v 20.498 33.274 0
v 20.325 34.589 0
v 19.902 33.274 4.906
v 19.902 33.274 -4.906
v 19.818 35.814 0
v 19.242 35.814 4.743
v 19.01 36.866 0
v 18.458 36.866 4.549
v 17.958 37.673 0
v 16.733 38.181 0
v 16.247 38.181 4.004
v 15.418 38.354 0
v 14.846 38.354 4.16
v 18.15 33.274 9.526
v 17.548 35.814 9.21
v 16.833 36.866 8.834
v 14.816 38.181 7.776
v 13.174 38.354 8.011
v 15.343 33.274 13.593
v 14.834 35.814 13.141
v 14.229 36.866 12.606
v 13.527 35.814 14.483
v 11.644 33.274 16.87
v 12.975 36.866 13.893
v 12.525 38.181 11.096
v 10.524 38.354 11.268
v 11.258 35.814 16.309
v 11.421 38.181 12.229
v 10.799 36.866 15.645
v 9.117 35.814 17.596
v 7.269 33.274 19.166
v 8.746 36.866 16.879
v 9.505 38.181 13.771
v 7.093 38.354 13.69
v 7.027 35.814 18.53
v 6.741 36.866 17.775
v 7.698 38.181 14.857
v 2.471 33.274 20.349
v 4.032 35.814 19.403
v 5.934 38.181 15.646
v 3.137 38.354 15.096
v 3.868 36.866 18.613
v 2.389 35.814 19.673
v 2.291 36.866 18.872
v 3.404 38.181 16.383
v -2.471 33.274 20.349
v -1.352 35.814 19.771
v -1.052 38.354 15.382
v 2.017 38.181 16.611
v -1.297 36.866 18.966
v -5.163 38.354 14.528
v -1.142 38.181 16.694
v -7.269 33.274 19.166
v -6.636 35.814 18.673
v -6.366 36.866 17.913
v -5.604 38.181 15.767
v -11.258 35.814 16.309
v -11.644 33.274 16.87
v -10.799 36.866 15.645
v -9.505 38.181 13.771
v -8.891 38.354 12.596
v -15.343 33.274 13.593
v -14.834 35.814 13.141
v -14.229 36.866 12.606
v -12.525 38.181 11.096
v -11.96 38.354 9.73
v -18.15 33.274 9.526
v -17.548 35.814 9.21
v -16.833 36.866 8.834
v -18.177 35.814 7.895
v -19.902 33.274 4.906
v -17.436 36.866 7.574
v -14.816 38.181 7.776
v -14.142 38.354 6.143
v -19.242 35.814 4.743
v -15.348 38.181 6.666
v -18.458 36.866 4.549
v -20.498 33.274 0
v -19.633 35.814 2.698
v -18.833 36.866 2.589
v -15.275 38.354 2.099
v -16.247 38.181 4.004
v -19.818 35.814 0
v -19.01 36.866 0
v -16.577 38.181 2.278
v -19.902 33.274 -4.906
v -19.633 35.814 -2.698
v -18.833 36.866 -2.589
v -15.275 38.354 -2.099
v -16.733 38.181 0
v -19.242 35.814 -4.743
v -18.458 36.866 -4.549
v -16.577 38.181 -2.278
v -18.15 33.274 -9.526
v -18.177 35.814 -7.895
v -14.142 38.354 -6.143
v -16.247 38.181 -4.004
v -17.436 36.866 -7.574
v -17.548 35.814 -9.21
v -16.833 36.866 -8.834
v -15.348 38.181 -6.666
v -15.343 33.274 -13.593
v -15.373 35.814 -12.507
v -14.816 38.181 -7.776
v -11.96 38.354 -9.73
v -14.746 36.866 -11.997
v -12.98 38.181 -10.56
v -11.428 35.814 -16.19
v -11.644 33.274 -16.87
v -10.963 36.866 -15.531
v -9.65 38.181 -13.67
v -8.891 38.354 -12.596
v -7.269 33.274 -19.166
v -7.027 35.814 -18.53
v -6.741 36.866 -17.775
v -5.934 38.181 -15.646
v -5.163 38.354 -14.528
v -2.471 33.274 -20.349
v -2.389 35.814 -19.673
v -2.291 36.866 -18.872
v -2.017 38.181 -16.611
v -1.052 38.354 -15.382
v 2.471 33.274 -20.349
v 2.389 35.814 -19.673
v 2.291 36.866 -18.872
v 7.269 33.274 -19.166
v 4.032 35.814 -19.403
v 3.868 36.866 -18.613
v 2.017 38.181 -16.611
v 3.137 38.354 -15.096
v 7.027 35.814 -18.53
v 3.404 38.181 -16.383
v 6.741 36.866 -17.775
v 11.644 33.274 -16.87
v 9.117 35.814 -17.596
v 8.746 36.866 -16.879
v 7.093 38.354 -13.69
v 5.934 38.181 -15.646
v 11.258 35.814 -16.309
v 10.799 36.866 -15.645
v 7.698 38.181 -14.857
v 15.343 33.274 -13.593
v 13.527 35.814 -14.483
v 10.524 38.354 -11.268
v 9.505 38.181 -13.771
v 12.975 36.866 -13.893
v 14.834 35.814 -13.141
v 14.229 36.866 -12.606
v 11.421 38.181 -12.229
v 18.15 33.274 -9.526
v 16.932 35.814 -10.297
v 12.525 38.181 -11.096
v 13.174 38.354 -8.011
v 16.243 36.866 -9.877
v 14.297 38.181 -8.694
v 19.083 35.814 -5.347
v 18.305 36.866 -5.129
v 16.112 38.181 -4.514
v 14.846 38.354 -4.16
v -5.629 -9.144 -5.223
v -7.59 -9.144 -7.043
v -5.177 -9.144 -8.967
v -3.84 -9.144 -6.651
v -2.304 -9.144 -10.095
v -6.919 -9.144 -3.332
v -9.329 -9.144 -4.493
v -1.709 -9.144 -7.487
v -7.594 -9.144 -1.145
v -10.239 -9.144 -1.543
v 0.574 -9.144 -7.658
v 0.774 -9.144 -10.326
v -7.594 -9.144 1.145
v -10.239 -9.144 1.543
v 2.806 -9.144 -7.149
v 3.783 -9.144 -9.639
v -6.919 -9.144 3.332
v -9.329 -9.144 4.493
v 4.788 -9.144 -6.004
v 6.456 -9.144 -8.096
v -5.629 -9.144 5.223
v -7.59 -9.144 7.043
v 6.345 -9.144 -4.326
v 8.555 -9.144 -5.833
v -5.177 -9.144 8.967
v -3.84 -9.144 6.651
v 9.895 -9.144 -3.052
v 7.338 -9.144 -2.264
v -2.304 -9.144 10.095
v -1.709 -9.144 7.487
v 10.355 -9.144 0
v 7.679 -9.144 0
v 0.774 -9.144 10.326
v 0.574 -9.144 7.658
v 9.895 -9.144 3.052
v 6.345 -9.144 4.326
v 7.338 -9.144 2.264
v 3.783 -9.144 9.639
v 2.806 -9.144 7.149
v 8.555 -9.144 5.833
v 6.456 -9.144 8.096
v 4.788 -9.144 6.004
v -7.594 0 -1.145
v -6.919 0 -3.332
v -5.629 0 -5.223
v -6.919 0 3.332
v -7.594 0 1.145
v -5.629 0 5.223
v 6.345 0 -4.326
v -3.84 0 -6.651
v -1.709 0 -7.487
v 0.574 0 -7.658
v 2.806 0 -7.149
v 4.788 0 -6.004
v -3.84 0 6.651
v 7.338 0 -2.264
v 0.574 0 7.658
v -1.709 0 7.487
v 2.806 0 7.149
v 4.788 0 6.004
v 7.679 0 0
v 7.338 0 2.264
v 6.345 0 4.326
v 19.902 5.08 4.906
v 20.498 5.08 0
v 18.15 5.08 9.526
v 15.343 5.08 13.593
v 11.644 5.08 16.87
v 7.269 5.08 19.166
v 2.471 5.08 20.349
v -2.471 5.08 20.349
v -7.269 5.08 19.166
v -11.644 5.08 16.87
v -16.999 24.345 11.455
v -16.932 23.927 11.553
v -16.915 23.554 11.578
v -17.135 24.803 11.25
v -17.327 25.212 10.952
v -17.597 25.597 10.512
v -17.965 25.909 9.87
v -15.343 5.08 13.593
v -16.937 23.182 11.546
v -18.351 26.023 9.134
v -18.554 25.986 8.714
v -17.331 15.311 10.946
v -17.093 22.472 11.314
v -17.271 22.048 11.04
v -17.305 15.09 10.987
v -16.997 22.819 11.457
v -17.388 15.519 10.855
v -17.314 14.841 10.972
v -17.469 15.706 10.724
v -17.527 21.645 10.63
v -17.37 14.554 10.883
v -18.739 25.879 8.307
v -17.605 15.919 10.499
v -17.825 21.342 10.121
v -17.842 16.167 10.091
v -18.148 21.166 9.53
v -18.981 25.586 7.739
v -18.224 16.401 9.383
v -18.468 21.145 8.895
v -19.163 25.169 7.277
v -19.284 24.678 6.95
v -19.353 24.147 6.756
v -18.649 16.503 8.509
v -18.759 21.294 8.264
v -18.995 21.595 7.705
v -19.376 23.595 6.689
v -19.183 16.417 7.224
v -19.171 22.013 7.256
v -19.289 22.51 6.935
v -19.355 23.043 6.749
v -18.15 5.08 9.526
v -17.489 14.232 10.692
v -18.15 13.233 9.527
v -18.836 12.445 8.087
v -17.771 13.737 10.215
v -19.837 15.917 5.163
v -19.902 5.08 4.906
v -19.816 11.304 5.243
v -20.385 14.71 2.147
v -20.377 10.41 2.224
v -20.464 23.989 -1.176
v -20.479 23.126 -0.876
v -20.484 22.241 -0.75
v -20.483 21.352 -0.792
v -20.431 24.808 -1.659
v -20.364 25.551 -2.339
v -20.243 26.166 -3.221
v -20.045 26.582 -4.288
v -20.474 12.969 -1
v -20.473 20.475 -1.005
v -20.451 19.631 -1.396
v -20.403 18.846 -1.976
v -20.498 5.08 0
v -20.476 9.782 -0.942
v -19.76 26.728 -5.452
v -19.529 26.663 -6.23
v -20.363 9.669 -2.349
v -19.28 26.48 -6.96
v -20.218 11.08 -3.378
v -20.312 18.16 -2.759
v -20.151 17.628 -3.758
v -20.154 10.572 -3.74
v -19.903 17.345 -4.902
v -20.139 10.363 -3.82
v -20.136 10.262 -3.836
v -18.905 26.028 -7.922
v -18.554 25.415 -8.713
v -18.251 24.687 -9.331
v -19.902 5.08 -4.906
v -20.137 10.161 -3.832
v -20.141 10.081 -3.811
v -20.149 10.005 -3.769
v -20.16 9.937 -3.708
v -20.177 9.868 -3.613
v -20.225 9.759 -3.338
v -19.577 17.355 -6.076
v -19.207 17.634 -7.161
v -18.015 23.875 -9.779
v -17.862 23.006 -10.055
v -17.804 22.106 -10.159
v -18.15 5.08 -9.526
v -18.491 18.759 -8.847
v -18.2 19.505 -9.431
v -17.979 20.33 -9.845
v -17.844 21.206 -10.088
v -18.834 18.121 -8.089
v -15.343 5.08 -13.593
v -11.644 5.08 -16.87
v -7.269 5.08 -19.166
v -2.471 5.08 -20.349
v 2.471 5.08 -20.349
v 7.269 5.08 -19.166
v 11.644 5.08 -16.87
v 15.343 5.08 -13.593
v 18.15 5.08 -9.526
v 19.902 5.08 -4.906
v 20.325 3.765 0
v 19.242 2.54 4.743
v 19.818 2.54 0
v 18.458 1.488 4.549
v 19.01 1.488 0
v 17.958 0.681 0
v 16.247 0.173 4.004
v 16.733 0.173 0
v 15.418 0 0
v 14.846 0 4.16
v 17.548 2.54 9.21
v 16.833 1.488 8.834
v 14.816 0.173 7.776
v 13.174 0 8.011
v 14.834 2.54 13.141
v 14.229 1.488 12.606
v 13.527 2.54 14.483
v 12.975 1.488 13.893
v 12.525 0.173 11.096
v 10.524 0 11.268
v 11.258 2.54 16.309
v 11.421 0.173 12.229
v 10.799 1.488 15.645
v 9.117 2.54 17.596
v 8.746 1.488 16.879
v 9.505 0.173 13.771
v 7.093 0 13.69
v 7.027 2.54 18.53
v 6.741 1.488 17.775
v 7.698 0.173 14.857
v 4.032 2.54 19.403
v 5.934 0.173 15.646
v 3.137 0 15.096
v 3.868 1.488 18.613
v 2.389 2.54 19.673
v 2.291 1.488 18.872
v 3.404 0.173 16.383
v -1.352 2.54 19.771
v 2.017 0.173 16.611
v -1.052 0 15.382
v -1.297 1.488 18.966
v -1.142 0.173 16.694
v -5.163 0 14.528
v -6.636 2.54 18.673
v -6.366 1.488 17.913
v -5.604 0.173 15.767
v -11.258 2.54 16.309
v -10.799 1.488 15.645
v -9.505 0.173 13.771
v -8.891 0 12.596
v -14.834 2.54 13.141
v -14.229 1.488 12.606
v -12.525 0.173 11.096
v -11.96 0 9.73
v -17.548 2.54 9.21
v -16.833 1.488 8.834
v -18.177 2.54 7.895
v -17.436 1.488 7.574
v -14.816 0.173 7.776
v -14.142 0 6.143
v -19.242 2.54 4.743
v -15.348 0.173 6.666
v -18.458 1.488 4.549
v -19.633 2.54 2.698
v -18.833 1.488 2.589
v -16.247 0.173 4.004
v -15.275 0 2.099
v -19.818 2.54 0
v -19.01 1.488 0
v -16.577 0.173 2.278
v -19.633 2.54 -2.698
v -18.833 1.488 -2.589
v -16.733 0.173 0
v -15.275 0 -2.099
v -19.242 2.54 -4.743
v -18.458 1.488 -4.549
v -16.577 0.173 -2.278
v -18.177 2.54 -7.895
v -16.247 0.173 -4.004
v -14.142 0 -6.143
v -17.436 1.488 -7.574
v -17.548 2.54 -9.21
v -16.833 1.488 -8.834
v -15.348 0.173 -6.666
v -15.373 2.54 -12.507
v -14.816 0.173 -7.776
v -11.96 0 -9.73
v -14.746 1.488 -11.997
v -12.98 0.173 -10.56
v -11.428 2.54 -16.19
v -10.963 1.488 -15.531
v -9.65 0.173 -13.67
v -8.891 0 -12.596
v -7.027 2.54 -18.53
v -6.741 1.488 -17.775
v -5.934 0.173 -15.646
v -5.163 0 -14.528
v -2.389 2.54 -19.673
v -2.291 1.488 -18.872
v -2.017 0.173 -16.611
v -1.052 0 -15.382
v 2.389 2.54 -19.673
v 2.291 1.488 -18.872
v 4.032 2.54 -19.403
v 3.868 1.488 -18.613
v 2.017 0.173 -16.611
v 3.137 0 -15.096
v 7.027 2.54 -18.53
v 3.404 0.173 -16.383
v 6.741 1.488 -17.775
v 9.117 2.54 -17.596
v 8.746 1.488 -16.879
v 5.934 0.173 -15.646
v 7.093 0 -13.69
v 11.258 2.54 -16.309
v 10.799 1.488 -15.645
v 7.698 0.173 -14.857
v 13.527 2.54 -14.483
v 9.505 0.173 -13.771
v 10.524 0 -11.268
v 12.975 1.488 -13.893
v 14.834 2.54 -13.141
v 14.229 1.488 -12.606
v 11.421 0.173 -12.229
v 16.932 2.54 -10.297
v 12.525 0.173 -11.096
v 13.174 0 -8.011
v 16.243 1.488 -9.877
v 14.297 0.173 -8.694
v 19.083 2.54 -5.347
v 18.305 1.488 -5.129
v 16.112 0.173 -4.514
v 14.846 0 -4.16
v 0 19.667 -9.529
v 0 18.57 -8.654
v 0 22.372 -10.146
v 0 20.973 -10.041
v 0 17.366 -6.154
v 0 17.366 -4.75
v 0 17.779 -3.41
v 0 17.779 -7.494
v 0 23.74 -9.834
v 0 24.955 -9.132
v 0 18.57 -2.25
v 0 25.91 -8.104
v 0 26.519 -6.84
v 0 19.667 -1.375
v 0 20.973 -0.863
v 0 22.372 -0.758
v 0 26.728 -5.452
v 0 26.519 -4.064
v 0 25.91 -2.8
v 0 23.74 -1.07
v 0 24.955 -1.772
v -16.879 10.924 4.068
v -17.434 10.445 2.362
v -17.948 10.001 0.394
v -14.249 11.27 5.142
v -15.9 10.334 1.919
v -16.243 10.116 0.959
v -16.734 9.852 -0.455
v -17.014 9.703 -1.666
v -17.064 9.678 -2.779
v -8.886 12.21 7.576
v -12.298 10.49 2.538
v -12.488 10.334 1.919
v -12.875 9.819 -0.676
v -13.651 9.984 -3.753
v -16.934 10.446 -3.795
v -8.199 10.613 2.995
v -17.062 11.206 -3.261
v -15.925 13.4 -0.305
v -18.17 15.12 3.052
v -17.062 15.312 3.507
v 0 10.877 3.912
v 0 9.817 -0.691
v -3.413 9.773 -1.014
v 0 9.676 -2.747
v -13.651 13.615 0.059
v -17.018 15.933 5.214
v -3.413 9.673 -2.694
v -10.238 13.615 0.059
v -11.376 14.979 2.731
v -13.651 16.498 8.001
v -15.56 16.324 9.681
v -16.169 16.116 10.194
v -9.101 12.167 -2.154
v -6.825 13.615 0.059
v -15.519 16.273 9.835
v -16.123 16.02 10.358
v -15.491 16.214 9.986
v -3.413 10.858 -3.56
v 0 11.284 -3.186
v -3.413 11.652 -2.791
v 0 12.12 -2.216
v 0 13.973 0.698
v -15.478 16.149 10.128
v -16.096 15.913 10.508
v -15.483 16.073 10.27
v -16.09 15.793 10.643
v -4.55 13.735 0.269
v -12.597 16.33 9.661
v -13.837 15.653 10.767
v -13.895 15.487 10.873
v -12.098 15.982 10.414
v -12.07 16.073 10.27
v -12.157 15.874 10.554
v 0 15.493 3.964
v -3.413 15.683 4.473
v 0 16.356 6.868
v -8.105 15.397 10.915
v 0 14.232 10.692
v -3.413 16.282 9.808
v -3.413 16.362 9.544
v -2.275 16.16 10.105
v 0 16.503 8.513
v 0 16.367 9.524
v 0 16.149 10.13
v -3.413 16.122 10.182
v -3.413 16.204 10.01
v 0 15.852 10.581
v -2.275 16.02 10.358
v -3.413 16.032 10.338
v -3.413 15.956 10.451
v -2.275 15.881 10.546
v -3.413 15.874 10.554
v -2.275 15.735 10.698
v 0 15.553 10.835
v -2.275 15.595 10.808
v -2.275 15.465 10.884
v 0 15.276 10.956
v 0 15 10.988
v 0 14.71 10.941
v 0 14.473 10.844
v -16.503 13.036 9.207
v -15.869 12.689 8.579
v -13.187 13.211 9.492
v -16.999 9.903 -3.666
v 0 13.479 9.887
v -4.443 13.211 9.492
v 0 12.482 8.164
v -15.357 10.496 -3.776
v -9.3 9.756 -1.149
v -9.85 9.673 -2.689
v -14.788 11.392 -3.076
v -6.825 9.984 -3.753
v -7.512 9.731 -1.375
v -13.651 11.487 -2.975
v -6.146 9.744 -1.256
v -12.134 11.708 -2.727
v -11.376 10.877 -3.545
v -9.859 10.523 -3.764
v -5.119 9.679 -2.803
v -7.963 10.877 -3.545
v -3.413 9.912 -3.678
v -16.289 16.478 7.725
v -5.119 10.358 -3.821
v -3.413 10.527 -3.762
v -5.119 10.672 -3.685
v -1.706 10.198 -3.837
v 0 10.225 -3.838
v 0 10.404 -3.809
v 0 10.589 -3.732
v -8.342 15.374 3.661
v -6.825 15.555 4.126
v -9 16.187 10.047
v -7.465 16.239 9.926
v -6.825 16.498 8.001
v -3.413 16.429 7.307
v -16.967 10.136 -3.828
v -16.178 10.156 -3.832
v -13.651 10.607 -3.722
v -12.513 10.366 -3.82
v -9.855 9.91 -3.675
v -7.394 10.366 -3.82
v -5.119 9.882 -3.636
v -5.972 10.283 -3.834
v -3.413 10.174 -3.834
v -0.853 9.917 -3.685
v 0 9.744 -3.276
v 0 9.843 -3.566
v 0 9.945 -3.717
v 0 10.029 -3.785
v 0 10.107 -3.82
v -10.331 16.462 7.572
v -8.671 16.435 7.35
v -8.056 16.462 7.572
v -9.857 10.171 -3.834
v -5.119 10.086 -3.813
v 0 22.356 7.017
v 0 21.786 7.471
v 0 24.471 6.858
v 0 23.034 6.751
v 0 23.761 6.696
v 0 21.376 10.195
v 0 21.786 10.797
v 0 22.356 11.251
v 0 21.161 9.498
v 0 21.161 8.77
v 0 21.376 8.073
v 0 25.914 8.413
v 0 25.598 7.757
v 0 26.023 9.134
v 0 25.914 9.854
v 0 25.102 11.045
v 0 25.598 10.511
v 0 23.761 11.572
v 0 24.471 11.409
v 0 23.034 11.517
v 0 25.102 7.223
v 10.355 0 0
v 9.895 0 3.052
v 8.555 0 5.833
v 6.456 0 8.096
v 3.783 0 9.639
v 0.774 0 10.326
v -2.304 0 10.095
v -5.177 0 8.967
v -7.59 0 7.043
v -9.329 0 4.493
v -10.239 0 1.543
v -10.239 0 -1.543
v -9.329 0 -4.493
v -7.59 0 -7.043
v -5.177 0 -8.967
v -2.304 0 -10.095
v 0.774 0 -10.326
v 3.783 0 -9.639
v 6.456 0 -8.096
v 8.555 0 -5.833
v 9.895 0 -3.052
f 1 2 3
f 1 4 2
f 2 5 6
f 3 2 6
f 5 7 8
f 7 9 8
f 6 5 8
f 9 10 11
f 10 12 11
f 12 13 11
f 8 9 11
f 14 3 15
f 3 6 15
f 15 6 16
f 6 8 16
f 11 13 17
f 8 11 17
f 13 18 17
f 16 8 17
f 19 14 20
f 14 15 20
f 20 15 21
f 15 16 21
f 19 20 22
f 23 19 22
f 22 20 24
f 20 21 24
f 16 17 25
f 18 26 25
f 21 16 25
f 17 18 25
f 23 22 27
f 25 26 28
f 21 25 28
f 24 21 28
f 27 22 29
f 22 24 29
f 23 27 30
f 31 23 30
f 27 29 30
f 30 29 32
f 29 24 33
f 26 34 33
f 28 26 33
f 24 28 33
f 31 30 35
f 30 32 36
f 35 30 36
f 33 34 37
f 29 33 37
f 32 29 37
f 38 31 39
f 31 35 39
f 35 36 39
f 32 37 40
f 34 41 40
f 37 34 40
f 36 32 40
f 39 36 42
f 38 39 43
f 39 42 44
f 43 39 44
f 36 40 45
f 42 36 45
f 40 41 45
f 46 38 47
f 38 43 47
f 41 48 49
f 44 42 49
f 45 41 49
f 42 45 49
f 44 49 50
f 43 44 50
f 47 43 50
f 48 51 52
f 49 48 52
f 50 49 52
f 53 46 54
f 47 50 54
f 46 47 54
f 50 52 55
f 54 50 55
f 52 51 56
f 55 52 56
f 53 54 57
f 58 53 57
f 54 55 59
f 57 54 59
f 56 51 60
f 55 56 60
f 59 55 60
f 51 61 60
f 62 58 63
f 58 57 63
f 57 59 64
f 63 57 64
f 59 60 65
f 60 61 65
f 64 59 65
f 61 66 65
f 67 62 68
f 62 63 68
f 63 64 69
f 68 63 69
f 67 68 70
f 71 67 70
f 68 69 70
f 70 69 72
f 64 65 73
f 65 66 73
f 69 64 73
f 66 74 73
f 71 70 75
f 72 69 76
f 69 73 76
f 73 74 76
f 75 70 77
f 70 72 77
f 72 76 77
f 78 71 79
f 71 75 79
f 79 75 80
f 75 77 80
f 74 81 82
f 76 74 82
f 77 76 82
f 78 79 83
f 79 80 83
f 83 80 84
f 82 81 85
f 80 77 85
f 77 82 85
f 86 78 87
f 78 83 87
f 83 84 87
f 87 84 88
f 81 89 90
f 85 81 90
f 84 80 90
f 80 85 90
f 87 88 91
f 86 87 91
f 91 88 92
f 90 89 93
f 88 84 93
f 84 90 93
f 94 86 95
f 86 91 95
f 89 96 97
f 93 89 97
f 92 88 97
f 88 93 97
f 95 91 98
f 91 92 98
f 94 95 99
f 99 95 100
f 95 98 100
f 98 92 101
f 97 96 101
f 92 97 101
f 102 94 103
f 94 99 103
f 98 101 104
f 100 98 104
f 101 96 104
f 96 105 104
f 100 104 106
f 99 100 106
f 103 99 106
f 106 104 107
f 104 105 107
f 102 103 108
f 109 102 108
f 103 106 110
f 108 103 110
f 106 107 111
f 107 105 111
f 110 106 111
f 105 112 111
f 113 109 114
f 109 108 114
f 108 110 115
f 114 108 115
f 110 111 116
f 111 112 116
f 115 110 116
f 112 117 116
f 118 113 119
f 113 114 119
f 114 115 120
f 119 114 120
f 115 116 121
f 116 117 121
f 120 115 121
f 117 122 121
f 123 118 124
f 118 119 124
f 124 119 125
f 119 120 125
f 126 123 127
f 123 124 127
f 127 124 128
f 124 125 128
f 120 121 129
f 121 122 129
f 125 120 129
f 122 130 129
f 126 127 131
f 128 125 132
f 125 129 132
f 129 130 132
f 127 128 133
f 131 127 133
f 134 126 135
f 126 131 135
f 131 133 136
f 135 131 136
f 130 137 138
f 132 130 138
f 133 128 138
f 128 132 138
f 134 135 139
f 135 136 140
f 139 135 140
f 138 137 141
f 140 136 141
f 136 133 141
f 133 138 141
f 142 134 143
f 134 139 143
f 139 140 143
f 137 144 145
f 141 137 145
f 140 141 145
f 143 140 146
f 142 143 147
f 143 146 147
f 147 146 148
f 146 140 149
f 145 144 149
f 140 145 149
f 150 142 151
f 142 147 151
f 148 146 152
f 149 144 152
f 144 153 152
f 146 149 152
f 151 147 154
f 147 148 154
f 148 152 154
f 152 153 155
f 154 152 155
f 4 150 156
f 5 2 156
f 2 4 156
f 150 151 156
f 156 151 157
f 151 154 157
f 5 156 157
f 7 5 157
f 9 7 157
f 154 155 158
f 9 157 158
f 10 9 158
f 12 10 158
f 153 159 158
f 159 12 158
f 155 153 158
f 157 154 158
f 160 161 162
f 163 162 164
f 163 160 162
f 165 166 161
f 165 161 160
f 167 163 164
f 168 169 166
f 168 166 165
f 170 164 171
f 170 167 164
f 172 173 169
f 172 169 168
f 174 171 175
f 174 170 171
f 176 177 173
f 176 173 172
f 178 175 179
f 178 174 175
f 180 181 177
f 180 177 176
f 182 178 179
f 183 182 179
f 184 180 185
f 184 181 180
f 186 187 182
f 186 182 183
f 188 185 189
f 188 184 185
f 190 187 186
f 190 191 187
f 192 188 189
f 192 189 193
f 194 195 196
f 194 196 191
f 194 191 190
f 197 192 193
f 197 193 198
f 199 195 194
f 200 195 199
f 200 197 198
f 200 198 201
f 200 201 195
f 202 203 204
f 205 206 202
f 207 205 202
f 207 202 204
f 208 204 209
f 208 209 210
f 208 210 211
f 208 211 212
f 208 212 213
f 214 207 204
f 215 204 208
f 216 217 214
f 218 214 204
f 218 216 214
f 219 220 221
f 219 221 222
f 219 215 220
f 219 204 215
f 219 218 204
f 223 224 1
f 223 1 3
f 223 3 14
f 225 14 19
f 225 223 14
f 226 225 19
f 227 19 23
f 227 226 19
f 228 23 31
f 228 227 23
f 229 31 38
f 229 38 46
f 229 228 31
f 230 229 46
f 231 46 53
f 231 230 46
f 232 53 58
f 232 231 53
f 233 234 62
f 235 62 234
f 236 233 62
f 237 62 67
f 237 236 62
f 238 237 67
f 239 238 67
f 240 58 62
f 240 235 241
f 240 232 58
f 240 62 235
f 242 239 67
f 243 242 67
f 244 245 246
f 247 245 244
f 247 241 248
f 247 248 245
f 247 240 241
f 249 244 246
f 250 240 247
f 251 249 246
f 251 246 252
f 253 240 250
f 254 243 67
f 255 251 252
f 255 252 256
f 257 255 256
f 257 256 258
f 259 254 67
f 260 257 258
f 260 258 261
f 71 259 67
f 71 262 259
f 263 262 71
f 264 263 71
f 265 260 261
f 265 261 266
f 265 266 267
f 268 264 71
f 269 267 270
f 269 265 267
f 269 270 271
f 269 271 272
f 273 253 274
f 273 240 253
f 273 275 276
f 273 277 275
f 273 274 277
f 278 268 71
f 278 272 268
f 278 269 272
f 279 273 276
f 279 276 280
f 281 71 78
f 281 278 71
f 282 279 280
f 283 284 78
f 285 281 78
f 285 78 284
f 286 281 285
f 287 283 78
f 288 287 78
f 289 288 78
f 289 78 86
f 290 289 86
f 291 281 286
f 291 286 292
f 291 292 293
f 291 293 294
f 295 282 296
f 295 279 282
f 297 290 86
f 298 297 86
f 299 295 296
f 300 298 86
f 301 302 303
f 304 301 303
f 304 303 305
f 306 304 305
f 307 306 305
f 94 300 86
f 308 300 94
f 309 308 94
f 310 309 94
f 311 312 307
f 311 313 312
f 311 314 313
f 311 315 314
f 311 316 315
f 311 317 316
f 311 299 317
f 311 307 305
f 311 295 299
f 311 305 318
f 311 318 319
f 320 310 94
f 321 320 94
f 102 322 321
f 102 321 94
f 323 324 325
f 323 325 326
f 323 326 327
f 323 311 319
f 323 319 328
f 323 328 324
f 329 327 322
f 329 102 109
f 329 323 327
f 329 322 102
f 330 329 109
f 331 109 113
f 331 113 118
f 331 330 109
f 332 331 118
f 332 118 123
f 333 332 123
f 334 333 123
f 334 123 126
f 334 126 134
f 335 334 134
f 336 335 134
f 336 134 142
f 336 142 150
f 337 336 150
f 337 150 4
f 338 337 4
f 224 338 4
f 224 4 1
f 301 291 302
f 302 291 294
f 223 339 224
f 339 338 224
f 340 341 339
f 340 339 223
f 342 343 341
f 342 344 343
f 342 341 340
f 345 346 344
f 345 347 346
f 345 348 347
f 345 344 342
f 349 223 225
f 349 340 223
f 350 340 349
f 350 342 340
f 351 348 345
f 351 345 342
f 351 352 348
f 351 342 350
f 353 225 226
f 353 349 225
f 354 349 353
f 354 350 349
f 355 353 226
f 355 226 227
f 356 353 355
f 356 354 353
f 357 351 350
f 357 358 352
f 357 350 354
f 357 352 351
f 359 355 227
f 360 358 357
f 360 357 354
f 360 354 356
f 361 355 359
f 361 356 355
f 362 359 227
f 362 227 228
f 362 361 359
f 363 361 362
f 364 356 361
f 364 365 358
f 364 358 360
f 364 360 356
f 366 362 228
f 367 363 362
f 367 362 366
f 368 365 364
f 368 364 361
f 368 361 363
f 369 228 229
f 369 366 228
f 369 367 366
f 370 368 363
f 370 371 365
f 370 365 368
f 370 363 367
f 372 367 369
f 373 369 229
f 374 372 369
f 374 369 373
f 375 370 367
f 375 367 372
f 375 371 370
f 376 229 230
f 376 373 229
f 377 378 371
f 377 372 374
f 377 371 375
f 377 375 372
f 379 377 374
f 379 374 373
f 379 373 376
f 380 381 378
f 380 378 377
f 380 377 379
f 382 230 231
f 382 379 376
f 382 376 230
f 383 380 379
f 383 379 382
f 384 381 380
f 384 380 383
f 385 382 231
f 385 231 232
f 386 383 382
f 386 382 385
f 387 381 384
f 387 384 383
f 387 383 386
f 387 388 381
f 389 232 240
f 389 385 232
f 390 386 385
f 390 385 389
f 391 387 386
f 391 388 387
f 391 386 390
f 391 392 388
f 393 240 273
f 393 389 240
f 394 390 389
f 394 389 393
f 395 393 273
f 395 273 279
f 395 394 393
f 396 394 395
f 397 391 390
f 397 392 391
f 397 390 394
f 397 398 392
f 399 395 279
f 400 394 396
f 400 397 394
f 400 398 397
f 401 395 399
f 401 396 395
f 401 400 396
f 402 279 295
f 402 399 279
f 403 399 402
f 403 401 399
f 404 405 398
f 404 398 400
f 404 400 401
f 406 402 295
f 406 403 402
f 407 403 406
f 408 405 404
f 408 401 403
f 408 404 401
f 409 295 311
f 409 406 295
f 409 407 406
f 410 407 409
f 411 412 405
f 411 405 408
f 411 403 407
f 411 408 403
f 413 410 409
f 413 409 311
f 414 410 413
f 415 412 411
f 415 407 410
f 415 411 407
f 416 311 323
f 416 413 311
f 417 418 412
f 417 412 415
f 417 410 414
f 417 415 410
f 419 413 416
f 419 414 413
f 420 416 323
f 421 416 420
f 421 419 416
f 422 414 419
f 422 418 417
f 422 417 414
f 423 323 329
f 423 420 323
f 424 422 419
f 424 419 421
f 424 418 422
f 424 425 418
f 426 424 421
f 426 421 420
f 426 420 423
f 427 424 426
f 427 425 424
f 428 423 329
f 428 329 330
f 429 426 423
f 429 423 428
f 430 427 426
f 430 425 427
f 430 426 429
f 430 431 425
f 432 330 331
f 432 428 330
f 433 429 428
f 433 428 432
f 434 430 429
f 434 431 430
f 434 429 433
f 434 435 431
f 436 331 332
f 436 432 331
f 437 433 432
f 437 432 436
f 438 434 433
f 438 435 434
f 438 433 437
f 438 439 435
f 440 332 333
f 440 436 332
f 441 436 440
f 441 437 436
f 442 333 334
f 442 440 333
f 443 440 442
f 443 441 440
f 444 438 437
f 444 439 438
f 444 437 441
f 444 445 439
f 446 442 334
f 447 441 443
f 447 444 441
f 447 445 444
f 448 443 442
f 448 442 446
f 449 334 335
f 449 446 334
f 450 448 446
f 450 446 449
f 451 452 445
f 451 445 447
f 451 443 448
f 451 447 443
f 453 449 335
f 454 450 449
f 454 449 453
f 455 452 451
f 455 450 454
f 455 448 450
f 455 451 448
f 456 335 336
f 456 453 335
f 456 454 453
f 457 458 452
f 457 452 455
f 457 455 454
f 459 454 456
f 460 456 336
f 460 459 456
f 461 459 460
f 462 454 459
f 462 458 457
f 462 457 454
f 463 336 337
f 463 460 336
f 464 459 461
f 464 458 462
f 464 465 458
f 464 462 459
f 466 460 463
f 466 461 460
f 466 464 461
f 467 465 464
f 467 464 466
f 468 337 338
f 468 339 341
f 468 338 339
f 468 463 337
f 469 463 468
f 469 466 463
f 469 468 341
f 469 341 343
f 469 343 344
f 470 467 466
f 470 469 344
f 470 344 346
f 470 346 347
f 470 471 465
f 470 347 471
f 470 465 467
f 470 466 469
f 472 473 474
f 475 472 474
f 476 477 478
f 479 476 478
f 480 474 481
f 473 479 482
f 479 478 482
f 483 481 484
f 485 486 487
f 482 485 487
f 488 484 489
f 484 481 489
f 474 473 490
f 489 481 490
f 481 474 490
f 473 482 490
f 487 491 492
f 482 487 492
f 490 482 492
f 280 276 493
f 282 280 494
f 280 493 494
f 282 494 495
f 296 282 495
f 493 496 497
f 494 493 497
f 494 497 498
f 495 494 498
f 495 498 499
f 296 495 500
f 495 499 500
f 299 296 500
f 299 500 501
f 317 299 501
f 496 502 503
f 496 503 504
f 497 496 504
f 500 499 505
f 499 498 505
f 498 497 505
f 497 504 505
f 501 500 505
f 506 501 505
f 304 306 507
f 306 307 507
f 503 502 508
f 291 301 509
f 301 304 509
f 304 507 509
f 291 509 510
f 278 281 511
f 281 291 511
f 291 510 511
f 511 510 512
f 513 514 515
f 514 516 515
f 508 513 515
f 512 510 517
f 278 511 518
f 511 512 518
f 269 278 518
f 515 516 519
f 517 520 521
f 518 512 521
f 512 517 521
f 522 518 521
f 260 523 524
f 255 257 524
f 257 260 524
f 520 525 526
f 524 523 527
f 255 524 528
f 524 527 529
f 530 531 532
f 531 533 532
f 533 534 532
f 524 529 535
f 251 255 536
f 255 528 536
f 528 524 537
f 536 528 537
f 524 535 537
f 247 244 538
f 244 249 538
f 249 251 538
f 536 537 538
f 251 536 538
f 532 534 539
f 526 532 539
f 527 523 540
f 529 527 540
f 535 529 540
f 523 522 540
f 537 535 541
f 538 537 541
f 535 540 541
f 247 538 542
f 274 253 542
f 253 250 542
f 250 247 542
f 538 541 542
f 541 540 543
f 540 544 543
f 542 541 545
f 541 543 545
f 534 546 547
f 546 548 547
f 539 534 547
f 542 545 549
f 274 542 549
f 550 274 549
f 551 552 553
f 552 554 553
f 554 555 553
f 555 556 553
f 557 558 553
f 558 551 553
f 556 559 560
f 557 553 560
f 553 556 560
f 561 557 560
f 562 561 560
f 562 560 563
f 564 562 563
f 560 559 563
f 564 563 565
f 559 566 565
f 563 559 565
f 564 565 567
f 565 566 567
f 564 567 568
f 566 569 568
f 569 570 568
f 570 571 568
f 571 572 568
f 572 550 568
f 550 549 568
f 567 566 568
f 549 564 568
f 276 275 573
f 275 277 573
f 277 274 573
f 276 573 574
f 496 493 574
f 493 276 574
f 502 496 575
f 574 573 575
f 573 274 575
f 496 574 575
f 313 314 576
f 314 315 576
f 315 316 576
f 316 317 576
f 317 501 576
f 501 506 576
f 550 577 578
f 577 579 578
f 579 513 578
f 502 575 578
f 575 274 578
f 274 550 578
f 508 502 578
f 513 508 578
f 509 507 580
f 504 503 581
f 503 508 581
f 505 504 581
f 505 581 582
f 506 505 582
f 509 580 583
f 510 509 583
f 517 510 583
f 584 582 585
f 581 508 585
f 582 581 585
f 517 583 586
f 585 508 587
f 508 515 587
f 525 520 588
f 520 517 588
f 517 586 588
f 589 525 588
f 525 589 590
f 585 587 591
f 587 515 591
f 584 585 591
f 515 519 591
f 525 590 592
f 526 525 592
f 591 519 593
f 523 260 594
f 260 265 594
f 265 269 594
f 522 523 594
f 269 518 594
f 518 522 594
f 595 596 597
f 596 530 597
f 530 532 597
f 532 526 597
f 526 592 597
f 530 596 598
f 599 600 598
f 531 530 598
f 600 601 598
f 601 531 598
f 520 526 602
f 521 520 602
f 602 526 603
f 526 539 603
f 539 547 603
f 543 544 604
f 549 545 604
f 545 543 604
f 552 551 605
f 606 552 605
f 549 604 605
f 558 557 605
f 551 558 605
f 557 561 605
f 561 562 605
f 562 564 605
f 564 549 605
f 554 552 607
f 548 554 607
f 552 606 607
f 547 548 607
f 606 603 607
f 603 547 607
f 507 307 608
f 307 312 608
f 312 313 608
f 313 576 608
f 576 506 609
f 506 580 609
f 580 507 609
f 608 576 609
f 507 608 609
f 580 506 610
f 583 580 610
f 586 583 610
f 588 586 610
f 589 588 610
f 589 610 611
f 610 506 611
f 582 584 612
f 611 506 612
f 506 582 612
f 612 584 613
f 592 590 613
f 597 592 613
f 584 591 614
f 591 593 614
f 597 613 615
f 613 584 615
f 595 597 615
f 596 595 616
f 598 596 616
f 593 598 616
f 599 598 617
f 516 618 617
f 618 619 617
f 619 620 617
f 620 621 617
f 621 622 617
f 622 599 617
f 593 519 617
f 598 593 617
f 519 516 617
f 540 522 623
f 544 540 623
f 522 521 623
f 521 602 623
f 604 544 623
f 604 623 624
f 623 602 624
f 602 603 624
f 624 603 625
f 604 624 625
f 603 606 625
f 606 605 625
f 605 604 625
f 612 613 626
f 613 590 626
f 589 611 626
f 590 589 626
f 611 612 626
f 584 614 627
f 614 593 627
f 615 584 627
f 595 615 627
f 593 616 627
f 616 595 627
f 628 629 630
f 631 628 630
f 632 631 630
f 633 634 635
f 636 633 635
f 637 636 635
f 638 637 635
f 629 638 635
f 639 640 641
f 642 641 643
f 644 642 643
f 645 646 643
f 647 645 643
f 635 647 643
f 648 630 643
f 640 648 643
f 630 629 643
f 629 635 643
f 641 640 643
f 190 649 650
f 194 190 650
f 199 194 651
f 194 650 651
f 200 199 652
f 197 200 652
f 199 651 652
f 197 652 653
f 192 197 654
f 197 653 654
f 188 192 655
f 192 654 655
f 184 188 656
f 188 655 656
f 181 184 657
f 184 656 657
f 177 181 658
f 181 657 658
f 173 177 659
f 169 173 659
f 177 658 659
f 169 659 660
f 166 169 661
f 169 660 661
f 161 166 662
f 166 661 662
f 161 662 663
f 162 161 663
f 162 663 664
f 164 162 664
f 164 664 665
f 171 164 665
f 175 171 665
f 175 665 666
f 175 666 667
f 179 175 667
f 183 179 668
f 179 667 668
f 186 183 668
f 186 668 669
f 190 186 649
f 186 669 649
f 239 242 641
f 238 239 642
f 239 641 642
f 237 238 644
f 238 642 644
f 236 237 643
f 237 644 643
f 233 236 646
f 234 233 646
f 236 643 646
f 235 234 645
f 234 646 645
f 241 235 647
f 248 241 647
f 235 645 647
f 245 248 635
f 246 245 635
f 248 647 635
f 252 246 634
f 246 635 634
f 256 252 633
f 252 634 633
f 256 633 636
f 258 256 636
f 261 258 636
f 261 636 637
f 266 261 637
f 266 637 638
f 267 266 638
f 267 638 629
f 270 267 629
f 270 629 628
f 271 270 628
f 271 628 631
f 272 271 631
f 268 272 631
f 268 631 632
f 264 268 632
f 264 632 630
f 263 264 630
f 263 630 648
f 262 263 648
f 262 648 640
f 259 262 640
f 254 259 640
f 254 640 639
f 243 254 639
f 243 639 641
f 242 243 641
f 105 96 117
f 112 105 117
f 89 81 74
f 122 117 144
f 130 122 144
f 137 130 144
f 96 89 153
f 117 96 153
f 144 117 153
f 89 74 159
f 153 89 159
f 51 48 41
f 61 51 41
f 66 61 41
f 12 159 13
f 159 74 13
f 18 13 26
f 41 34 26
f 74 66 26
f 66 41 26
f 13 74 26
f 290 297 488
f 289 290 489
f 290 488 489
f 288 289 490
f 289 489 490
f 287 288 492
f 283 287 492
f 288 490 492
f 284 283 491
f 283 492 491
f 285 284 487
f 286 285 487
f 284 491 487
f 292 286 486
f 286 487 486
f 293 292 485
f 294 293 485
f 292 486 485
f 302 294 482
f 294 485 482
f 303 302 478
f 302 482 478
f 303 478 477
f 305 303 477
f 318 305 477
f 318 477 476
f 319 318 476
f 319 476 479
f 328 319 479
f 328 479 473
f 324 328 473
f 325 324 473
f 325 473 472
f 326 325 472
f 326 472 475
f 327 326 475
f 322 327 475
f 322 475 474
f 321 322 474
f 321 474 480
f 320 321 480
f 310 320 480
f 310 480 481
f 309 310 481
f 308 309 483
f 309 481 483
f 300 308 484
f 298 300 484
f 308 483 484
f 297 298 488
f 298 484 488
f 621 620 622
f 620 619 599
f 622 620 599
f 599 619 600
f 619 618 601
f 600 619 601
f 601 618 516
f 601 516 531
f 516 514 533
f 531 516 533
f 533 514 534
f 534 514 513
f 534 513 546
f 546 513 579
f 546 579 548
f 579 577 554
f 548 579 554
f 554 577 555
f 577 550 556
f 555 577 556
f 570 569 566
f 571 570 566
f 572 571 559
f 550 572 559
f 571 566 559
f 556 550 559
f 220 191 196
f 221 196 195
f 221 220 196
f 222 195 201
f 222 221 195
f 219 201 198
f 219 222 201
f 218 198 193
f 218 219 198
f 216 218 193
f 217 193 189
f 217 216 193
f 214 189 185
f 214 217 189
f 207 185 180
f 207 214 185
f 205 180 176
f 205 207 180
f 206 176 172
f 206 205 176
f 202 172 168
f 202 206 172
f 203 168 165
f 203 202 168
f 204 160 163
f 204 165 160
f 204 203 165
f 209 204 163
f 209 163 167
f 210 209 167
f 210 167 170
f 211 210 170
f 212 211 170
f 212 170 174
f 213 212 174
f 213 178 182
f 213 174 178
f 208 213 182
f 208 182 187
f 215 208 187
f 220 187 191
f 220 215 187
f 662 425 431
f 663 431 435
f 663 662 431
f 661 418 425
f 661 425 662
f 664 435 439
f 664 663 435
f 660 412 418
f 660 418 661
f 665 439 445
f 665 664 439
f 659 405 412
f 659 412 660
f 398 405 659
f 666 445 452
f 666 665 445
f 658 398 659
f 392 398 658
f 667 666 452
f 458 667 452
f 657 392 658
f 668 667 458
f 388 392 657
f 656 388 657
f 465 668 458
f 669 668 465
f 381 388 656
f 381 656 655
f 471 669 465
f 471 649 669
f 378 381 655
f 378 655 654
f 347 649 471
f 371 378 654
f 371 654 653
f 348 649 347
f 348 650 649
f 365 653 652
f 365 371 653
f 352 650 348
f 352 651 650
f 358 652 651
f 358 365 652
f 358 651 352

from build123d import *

# Parameters (mm, degrees)
F0_R      = 20.498108569
F1_DEPTH  = 38.354
F2_R      = 5.08
F3_R      = 10.3545358817
F4_DEPTH  = 9.144
F5_R      = 7.6794076655
F4_FACE_R = 10.3545358817
F6_DEPTH  = 20.066
F7_R      = 2.4445782071
F7_R_2    = 4.7073560898
F8_DEPTH  = 51.308


with BuildPart() as f1:
    # F0 (on Front) → F1 (new body)
    with BuildSketch(Plane.XZ):
        Circle(F0_R)
    extrude(amount=-F1_DEPTH)

    # F2
    f2_edges = [f1.edges().sort_by_distance(p)[0] for p in [
        (-20.498109, 0, 0),
        (-20.498109, 38.354, 0),
    ]]
    fillet(f2_edges, radius=F2_R)

    # F3 (on Front) → F4 (join)
    with BuildSketch(Plane.XZ):
        Circle(F3_R)
    extrude(amount=F4_DEPTH)

    # F5 (on Front) + F4_face (on face) → F6 (cut)
    with BuildSketch(Plane.XZ):
        Circle(F5_R)
    with BuildSketch(Plane.XZ.offset(9.144)):
        Circle(F4_FACE_R)
    extrude(amount=F6_DEPTH, mode=Mode.SUBTRACT)

    # F7 (on Right) → F8 (cut)
    with BuildSketch(Plane.YZ):
        with Locations((23.5781669617, 9.1338856146)):
            Circle(F7_R)
        with Locations((22.0204498619, -5.4520084523)):
            Circle(F7_R_2)
        with BuildLine():
            add(Edge.make_bspline(
                [(14.2318671569, 10.691601783), (11.6649759051, 8.7850122349), (5.8643220815, -13.5165030483), (18.8512904338, 7.7362532922), (15.4725782315, 11.6131549519), (14.2318671569, 10.691601783)],
                knots=[0, 0, 0, 0, 0.4118458542, 0.8009336344, 1, 1, 1, 1], degree=3))
        make_face()
    extrude(amount=-F8_DEPTH, mode=Mode.SUBTRACT)


solid = f1.part
